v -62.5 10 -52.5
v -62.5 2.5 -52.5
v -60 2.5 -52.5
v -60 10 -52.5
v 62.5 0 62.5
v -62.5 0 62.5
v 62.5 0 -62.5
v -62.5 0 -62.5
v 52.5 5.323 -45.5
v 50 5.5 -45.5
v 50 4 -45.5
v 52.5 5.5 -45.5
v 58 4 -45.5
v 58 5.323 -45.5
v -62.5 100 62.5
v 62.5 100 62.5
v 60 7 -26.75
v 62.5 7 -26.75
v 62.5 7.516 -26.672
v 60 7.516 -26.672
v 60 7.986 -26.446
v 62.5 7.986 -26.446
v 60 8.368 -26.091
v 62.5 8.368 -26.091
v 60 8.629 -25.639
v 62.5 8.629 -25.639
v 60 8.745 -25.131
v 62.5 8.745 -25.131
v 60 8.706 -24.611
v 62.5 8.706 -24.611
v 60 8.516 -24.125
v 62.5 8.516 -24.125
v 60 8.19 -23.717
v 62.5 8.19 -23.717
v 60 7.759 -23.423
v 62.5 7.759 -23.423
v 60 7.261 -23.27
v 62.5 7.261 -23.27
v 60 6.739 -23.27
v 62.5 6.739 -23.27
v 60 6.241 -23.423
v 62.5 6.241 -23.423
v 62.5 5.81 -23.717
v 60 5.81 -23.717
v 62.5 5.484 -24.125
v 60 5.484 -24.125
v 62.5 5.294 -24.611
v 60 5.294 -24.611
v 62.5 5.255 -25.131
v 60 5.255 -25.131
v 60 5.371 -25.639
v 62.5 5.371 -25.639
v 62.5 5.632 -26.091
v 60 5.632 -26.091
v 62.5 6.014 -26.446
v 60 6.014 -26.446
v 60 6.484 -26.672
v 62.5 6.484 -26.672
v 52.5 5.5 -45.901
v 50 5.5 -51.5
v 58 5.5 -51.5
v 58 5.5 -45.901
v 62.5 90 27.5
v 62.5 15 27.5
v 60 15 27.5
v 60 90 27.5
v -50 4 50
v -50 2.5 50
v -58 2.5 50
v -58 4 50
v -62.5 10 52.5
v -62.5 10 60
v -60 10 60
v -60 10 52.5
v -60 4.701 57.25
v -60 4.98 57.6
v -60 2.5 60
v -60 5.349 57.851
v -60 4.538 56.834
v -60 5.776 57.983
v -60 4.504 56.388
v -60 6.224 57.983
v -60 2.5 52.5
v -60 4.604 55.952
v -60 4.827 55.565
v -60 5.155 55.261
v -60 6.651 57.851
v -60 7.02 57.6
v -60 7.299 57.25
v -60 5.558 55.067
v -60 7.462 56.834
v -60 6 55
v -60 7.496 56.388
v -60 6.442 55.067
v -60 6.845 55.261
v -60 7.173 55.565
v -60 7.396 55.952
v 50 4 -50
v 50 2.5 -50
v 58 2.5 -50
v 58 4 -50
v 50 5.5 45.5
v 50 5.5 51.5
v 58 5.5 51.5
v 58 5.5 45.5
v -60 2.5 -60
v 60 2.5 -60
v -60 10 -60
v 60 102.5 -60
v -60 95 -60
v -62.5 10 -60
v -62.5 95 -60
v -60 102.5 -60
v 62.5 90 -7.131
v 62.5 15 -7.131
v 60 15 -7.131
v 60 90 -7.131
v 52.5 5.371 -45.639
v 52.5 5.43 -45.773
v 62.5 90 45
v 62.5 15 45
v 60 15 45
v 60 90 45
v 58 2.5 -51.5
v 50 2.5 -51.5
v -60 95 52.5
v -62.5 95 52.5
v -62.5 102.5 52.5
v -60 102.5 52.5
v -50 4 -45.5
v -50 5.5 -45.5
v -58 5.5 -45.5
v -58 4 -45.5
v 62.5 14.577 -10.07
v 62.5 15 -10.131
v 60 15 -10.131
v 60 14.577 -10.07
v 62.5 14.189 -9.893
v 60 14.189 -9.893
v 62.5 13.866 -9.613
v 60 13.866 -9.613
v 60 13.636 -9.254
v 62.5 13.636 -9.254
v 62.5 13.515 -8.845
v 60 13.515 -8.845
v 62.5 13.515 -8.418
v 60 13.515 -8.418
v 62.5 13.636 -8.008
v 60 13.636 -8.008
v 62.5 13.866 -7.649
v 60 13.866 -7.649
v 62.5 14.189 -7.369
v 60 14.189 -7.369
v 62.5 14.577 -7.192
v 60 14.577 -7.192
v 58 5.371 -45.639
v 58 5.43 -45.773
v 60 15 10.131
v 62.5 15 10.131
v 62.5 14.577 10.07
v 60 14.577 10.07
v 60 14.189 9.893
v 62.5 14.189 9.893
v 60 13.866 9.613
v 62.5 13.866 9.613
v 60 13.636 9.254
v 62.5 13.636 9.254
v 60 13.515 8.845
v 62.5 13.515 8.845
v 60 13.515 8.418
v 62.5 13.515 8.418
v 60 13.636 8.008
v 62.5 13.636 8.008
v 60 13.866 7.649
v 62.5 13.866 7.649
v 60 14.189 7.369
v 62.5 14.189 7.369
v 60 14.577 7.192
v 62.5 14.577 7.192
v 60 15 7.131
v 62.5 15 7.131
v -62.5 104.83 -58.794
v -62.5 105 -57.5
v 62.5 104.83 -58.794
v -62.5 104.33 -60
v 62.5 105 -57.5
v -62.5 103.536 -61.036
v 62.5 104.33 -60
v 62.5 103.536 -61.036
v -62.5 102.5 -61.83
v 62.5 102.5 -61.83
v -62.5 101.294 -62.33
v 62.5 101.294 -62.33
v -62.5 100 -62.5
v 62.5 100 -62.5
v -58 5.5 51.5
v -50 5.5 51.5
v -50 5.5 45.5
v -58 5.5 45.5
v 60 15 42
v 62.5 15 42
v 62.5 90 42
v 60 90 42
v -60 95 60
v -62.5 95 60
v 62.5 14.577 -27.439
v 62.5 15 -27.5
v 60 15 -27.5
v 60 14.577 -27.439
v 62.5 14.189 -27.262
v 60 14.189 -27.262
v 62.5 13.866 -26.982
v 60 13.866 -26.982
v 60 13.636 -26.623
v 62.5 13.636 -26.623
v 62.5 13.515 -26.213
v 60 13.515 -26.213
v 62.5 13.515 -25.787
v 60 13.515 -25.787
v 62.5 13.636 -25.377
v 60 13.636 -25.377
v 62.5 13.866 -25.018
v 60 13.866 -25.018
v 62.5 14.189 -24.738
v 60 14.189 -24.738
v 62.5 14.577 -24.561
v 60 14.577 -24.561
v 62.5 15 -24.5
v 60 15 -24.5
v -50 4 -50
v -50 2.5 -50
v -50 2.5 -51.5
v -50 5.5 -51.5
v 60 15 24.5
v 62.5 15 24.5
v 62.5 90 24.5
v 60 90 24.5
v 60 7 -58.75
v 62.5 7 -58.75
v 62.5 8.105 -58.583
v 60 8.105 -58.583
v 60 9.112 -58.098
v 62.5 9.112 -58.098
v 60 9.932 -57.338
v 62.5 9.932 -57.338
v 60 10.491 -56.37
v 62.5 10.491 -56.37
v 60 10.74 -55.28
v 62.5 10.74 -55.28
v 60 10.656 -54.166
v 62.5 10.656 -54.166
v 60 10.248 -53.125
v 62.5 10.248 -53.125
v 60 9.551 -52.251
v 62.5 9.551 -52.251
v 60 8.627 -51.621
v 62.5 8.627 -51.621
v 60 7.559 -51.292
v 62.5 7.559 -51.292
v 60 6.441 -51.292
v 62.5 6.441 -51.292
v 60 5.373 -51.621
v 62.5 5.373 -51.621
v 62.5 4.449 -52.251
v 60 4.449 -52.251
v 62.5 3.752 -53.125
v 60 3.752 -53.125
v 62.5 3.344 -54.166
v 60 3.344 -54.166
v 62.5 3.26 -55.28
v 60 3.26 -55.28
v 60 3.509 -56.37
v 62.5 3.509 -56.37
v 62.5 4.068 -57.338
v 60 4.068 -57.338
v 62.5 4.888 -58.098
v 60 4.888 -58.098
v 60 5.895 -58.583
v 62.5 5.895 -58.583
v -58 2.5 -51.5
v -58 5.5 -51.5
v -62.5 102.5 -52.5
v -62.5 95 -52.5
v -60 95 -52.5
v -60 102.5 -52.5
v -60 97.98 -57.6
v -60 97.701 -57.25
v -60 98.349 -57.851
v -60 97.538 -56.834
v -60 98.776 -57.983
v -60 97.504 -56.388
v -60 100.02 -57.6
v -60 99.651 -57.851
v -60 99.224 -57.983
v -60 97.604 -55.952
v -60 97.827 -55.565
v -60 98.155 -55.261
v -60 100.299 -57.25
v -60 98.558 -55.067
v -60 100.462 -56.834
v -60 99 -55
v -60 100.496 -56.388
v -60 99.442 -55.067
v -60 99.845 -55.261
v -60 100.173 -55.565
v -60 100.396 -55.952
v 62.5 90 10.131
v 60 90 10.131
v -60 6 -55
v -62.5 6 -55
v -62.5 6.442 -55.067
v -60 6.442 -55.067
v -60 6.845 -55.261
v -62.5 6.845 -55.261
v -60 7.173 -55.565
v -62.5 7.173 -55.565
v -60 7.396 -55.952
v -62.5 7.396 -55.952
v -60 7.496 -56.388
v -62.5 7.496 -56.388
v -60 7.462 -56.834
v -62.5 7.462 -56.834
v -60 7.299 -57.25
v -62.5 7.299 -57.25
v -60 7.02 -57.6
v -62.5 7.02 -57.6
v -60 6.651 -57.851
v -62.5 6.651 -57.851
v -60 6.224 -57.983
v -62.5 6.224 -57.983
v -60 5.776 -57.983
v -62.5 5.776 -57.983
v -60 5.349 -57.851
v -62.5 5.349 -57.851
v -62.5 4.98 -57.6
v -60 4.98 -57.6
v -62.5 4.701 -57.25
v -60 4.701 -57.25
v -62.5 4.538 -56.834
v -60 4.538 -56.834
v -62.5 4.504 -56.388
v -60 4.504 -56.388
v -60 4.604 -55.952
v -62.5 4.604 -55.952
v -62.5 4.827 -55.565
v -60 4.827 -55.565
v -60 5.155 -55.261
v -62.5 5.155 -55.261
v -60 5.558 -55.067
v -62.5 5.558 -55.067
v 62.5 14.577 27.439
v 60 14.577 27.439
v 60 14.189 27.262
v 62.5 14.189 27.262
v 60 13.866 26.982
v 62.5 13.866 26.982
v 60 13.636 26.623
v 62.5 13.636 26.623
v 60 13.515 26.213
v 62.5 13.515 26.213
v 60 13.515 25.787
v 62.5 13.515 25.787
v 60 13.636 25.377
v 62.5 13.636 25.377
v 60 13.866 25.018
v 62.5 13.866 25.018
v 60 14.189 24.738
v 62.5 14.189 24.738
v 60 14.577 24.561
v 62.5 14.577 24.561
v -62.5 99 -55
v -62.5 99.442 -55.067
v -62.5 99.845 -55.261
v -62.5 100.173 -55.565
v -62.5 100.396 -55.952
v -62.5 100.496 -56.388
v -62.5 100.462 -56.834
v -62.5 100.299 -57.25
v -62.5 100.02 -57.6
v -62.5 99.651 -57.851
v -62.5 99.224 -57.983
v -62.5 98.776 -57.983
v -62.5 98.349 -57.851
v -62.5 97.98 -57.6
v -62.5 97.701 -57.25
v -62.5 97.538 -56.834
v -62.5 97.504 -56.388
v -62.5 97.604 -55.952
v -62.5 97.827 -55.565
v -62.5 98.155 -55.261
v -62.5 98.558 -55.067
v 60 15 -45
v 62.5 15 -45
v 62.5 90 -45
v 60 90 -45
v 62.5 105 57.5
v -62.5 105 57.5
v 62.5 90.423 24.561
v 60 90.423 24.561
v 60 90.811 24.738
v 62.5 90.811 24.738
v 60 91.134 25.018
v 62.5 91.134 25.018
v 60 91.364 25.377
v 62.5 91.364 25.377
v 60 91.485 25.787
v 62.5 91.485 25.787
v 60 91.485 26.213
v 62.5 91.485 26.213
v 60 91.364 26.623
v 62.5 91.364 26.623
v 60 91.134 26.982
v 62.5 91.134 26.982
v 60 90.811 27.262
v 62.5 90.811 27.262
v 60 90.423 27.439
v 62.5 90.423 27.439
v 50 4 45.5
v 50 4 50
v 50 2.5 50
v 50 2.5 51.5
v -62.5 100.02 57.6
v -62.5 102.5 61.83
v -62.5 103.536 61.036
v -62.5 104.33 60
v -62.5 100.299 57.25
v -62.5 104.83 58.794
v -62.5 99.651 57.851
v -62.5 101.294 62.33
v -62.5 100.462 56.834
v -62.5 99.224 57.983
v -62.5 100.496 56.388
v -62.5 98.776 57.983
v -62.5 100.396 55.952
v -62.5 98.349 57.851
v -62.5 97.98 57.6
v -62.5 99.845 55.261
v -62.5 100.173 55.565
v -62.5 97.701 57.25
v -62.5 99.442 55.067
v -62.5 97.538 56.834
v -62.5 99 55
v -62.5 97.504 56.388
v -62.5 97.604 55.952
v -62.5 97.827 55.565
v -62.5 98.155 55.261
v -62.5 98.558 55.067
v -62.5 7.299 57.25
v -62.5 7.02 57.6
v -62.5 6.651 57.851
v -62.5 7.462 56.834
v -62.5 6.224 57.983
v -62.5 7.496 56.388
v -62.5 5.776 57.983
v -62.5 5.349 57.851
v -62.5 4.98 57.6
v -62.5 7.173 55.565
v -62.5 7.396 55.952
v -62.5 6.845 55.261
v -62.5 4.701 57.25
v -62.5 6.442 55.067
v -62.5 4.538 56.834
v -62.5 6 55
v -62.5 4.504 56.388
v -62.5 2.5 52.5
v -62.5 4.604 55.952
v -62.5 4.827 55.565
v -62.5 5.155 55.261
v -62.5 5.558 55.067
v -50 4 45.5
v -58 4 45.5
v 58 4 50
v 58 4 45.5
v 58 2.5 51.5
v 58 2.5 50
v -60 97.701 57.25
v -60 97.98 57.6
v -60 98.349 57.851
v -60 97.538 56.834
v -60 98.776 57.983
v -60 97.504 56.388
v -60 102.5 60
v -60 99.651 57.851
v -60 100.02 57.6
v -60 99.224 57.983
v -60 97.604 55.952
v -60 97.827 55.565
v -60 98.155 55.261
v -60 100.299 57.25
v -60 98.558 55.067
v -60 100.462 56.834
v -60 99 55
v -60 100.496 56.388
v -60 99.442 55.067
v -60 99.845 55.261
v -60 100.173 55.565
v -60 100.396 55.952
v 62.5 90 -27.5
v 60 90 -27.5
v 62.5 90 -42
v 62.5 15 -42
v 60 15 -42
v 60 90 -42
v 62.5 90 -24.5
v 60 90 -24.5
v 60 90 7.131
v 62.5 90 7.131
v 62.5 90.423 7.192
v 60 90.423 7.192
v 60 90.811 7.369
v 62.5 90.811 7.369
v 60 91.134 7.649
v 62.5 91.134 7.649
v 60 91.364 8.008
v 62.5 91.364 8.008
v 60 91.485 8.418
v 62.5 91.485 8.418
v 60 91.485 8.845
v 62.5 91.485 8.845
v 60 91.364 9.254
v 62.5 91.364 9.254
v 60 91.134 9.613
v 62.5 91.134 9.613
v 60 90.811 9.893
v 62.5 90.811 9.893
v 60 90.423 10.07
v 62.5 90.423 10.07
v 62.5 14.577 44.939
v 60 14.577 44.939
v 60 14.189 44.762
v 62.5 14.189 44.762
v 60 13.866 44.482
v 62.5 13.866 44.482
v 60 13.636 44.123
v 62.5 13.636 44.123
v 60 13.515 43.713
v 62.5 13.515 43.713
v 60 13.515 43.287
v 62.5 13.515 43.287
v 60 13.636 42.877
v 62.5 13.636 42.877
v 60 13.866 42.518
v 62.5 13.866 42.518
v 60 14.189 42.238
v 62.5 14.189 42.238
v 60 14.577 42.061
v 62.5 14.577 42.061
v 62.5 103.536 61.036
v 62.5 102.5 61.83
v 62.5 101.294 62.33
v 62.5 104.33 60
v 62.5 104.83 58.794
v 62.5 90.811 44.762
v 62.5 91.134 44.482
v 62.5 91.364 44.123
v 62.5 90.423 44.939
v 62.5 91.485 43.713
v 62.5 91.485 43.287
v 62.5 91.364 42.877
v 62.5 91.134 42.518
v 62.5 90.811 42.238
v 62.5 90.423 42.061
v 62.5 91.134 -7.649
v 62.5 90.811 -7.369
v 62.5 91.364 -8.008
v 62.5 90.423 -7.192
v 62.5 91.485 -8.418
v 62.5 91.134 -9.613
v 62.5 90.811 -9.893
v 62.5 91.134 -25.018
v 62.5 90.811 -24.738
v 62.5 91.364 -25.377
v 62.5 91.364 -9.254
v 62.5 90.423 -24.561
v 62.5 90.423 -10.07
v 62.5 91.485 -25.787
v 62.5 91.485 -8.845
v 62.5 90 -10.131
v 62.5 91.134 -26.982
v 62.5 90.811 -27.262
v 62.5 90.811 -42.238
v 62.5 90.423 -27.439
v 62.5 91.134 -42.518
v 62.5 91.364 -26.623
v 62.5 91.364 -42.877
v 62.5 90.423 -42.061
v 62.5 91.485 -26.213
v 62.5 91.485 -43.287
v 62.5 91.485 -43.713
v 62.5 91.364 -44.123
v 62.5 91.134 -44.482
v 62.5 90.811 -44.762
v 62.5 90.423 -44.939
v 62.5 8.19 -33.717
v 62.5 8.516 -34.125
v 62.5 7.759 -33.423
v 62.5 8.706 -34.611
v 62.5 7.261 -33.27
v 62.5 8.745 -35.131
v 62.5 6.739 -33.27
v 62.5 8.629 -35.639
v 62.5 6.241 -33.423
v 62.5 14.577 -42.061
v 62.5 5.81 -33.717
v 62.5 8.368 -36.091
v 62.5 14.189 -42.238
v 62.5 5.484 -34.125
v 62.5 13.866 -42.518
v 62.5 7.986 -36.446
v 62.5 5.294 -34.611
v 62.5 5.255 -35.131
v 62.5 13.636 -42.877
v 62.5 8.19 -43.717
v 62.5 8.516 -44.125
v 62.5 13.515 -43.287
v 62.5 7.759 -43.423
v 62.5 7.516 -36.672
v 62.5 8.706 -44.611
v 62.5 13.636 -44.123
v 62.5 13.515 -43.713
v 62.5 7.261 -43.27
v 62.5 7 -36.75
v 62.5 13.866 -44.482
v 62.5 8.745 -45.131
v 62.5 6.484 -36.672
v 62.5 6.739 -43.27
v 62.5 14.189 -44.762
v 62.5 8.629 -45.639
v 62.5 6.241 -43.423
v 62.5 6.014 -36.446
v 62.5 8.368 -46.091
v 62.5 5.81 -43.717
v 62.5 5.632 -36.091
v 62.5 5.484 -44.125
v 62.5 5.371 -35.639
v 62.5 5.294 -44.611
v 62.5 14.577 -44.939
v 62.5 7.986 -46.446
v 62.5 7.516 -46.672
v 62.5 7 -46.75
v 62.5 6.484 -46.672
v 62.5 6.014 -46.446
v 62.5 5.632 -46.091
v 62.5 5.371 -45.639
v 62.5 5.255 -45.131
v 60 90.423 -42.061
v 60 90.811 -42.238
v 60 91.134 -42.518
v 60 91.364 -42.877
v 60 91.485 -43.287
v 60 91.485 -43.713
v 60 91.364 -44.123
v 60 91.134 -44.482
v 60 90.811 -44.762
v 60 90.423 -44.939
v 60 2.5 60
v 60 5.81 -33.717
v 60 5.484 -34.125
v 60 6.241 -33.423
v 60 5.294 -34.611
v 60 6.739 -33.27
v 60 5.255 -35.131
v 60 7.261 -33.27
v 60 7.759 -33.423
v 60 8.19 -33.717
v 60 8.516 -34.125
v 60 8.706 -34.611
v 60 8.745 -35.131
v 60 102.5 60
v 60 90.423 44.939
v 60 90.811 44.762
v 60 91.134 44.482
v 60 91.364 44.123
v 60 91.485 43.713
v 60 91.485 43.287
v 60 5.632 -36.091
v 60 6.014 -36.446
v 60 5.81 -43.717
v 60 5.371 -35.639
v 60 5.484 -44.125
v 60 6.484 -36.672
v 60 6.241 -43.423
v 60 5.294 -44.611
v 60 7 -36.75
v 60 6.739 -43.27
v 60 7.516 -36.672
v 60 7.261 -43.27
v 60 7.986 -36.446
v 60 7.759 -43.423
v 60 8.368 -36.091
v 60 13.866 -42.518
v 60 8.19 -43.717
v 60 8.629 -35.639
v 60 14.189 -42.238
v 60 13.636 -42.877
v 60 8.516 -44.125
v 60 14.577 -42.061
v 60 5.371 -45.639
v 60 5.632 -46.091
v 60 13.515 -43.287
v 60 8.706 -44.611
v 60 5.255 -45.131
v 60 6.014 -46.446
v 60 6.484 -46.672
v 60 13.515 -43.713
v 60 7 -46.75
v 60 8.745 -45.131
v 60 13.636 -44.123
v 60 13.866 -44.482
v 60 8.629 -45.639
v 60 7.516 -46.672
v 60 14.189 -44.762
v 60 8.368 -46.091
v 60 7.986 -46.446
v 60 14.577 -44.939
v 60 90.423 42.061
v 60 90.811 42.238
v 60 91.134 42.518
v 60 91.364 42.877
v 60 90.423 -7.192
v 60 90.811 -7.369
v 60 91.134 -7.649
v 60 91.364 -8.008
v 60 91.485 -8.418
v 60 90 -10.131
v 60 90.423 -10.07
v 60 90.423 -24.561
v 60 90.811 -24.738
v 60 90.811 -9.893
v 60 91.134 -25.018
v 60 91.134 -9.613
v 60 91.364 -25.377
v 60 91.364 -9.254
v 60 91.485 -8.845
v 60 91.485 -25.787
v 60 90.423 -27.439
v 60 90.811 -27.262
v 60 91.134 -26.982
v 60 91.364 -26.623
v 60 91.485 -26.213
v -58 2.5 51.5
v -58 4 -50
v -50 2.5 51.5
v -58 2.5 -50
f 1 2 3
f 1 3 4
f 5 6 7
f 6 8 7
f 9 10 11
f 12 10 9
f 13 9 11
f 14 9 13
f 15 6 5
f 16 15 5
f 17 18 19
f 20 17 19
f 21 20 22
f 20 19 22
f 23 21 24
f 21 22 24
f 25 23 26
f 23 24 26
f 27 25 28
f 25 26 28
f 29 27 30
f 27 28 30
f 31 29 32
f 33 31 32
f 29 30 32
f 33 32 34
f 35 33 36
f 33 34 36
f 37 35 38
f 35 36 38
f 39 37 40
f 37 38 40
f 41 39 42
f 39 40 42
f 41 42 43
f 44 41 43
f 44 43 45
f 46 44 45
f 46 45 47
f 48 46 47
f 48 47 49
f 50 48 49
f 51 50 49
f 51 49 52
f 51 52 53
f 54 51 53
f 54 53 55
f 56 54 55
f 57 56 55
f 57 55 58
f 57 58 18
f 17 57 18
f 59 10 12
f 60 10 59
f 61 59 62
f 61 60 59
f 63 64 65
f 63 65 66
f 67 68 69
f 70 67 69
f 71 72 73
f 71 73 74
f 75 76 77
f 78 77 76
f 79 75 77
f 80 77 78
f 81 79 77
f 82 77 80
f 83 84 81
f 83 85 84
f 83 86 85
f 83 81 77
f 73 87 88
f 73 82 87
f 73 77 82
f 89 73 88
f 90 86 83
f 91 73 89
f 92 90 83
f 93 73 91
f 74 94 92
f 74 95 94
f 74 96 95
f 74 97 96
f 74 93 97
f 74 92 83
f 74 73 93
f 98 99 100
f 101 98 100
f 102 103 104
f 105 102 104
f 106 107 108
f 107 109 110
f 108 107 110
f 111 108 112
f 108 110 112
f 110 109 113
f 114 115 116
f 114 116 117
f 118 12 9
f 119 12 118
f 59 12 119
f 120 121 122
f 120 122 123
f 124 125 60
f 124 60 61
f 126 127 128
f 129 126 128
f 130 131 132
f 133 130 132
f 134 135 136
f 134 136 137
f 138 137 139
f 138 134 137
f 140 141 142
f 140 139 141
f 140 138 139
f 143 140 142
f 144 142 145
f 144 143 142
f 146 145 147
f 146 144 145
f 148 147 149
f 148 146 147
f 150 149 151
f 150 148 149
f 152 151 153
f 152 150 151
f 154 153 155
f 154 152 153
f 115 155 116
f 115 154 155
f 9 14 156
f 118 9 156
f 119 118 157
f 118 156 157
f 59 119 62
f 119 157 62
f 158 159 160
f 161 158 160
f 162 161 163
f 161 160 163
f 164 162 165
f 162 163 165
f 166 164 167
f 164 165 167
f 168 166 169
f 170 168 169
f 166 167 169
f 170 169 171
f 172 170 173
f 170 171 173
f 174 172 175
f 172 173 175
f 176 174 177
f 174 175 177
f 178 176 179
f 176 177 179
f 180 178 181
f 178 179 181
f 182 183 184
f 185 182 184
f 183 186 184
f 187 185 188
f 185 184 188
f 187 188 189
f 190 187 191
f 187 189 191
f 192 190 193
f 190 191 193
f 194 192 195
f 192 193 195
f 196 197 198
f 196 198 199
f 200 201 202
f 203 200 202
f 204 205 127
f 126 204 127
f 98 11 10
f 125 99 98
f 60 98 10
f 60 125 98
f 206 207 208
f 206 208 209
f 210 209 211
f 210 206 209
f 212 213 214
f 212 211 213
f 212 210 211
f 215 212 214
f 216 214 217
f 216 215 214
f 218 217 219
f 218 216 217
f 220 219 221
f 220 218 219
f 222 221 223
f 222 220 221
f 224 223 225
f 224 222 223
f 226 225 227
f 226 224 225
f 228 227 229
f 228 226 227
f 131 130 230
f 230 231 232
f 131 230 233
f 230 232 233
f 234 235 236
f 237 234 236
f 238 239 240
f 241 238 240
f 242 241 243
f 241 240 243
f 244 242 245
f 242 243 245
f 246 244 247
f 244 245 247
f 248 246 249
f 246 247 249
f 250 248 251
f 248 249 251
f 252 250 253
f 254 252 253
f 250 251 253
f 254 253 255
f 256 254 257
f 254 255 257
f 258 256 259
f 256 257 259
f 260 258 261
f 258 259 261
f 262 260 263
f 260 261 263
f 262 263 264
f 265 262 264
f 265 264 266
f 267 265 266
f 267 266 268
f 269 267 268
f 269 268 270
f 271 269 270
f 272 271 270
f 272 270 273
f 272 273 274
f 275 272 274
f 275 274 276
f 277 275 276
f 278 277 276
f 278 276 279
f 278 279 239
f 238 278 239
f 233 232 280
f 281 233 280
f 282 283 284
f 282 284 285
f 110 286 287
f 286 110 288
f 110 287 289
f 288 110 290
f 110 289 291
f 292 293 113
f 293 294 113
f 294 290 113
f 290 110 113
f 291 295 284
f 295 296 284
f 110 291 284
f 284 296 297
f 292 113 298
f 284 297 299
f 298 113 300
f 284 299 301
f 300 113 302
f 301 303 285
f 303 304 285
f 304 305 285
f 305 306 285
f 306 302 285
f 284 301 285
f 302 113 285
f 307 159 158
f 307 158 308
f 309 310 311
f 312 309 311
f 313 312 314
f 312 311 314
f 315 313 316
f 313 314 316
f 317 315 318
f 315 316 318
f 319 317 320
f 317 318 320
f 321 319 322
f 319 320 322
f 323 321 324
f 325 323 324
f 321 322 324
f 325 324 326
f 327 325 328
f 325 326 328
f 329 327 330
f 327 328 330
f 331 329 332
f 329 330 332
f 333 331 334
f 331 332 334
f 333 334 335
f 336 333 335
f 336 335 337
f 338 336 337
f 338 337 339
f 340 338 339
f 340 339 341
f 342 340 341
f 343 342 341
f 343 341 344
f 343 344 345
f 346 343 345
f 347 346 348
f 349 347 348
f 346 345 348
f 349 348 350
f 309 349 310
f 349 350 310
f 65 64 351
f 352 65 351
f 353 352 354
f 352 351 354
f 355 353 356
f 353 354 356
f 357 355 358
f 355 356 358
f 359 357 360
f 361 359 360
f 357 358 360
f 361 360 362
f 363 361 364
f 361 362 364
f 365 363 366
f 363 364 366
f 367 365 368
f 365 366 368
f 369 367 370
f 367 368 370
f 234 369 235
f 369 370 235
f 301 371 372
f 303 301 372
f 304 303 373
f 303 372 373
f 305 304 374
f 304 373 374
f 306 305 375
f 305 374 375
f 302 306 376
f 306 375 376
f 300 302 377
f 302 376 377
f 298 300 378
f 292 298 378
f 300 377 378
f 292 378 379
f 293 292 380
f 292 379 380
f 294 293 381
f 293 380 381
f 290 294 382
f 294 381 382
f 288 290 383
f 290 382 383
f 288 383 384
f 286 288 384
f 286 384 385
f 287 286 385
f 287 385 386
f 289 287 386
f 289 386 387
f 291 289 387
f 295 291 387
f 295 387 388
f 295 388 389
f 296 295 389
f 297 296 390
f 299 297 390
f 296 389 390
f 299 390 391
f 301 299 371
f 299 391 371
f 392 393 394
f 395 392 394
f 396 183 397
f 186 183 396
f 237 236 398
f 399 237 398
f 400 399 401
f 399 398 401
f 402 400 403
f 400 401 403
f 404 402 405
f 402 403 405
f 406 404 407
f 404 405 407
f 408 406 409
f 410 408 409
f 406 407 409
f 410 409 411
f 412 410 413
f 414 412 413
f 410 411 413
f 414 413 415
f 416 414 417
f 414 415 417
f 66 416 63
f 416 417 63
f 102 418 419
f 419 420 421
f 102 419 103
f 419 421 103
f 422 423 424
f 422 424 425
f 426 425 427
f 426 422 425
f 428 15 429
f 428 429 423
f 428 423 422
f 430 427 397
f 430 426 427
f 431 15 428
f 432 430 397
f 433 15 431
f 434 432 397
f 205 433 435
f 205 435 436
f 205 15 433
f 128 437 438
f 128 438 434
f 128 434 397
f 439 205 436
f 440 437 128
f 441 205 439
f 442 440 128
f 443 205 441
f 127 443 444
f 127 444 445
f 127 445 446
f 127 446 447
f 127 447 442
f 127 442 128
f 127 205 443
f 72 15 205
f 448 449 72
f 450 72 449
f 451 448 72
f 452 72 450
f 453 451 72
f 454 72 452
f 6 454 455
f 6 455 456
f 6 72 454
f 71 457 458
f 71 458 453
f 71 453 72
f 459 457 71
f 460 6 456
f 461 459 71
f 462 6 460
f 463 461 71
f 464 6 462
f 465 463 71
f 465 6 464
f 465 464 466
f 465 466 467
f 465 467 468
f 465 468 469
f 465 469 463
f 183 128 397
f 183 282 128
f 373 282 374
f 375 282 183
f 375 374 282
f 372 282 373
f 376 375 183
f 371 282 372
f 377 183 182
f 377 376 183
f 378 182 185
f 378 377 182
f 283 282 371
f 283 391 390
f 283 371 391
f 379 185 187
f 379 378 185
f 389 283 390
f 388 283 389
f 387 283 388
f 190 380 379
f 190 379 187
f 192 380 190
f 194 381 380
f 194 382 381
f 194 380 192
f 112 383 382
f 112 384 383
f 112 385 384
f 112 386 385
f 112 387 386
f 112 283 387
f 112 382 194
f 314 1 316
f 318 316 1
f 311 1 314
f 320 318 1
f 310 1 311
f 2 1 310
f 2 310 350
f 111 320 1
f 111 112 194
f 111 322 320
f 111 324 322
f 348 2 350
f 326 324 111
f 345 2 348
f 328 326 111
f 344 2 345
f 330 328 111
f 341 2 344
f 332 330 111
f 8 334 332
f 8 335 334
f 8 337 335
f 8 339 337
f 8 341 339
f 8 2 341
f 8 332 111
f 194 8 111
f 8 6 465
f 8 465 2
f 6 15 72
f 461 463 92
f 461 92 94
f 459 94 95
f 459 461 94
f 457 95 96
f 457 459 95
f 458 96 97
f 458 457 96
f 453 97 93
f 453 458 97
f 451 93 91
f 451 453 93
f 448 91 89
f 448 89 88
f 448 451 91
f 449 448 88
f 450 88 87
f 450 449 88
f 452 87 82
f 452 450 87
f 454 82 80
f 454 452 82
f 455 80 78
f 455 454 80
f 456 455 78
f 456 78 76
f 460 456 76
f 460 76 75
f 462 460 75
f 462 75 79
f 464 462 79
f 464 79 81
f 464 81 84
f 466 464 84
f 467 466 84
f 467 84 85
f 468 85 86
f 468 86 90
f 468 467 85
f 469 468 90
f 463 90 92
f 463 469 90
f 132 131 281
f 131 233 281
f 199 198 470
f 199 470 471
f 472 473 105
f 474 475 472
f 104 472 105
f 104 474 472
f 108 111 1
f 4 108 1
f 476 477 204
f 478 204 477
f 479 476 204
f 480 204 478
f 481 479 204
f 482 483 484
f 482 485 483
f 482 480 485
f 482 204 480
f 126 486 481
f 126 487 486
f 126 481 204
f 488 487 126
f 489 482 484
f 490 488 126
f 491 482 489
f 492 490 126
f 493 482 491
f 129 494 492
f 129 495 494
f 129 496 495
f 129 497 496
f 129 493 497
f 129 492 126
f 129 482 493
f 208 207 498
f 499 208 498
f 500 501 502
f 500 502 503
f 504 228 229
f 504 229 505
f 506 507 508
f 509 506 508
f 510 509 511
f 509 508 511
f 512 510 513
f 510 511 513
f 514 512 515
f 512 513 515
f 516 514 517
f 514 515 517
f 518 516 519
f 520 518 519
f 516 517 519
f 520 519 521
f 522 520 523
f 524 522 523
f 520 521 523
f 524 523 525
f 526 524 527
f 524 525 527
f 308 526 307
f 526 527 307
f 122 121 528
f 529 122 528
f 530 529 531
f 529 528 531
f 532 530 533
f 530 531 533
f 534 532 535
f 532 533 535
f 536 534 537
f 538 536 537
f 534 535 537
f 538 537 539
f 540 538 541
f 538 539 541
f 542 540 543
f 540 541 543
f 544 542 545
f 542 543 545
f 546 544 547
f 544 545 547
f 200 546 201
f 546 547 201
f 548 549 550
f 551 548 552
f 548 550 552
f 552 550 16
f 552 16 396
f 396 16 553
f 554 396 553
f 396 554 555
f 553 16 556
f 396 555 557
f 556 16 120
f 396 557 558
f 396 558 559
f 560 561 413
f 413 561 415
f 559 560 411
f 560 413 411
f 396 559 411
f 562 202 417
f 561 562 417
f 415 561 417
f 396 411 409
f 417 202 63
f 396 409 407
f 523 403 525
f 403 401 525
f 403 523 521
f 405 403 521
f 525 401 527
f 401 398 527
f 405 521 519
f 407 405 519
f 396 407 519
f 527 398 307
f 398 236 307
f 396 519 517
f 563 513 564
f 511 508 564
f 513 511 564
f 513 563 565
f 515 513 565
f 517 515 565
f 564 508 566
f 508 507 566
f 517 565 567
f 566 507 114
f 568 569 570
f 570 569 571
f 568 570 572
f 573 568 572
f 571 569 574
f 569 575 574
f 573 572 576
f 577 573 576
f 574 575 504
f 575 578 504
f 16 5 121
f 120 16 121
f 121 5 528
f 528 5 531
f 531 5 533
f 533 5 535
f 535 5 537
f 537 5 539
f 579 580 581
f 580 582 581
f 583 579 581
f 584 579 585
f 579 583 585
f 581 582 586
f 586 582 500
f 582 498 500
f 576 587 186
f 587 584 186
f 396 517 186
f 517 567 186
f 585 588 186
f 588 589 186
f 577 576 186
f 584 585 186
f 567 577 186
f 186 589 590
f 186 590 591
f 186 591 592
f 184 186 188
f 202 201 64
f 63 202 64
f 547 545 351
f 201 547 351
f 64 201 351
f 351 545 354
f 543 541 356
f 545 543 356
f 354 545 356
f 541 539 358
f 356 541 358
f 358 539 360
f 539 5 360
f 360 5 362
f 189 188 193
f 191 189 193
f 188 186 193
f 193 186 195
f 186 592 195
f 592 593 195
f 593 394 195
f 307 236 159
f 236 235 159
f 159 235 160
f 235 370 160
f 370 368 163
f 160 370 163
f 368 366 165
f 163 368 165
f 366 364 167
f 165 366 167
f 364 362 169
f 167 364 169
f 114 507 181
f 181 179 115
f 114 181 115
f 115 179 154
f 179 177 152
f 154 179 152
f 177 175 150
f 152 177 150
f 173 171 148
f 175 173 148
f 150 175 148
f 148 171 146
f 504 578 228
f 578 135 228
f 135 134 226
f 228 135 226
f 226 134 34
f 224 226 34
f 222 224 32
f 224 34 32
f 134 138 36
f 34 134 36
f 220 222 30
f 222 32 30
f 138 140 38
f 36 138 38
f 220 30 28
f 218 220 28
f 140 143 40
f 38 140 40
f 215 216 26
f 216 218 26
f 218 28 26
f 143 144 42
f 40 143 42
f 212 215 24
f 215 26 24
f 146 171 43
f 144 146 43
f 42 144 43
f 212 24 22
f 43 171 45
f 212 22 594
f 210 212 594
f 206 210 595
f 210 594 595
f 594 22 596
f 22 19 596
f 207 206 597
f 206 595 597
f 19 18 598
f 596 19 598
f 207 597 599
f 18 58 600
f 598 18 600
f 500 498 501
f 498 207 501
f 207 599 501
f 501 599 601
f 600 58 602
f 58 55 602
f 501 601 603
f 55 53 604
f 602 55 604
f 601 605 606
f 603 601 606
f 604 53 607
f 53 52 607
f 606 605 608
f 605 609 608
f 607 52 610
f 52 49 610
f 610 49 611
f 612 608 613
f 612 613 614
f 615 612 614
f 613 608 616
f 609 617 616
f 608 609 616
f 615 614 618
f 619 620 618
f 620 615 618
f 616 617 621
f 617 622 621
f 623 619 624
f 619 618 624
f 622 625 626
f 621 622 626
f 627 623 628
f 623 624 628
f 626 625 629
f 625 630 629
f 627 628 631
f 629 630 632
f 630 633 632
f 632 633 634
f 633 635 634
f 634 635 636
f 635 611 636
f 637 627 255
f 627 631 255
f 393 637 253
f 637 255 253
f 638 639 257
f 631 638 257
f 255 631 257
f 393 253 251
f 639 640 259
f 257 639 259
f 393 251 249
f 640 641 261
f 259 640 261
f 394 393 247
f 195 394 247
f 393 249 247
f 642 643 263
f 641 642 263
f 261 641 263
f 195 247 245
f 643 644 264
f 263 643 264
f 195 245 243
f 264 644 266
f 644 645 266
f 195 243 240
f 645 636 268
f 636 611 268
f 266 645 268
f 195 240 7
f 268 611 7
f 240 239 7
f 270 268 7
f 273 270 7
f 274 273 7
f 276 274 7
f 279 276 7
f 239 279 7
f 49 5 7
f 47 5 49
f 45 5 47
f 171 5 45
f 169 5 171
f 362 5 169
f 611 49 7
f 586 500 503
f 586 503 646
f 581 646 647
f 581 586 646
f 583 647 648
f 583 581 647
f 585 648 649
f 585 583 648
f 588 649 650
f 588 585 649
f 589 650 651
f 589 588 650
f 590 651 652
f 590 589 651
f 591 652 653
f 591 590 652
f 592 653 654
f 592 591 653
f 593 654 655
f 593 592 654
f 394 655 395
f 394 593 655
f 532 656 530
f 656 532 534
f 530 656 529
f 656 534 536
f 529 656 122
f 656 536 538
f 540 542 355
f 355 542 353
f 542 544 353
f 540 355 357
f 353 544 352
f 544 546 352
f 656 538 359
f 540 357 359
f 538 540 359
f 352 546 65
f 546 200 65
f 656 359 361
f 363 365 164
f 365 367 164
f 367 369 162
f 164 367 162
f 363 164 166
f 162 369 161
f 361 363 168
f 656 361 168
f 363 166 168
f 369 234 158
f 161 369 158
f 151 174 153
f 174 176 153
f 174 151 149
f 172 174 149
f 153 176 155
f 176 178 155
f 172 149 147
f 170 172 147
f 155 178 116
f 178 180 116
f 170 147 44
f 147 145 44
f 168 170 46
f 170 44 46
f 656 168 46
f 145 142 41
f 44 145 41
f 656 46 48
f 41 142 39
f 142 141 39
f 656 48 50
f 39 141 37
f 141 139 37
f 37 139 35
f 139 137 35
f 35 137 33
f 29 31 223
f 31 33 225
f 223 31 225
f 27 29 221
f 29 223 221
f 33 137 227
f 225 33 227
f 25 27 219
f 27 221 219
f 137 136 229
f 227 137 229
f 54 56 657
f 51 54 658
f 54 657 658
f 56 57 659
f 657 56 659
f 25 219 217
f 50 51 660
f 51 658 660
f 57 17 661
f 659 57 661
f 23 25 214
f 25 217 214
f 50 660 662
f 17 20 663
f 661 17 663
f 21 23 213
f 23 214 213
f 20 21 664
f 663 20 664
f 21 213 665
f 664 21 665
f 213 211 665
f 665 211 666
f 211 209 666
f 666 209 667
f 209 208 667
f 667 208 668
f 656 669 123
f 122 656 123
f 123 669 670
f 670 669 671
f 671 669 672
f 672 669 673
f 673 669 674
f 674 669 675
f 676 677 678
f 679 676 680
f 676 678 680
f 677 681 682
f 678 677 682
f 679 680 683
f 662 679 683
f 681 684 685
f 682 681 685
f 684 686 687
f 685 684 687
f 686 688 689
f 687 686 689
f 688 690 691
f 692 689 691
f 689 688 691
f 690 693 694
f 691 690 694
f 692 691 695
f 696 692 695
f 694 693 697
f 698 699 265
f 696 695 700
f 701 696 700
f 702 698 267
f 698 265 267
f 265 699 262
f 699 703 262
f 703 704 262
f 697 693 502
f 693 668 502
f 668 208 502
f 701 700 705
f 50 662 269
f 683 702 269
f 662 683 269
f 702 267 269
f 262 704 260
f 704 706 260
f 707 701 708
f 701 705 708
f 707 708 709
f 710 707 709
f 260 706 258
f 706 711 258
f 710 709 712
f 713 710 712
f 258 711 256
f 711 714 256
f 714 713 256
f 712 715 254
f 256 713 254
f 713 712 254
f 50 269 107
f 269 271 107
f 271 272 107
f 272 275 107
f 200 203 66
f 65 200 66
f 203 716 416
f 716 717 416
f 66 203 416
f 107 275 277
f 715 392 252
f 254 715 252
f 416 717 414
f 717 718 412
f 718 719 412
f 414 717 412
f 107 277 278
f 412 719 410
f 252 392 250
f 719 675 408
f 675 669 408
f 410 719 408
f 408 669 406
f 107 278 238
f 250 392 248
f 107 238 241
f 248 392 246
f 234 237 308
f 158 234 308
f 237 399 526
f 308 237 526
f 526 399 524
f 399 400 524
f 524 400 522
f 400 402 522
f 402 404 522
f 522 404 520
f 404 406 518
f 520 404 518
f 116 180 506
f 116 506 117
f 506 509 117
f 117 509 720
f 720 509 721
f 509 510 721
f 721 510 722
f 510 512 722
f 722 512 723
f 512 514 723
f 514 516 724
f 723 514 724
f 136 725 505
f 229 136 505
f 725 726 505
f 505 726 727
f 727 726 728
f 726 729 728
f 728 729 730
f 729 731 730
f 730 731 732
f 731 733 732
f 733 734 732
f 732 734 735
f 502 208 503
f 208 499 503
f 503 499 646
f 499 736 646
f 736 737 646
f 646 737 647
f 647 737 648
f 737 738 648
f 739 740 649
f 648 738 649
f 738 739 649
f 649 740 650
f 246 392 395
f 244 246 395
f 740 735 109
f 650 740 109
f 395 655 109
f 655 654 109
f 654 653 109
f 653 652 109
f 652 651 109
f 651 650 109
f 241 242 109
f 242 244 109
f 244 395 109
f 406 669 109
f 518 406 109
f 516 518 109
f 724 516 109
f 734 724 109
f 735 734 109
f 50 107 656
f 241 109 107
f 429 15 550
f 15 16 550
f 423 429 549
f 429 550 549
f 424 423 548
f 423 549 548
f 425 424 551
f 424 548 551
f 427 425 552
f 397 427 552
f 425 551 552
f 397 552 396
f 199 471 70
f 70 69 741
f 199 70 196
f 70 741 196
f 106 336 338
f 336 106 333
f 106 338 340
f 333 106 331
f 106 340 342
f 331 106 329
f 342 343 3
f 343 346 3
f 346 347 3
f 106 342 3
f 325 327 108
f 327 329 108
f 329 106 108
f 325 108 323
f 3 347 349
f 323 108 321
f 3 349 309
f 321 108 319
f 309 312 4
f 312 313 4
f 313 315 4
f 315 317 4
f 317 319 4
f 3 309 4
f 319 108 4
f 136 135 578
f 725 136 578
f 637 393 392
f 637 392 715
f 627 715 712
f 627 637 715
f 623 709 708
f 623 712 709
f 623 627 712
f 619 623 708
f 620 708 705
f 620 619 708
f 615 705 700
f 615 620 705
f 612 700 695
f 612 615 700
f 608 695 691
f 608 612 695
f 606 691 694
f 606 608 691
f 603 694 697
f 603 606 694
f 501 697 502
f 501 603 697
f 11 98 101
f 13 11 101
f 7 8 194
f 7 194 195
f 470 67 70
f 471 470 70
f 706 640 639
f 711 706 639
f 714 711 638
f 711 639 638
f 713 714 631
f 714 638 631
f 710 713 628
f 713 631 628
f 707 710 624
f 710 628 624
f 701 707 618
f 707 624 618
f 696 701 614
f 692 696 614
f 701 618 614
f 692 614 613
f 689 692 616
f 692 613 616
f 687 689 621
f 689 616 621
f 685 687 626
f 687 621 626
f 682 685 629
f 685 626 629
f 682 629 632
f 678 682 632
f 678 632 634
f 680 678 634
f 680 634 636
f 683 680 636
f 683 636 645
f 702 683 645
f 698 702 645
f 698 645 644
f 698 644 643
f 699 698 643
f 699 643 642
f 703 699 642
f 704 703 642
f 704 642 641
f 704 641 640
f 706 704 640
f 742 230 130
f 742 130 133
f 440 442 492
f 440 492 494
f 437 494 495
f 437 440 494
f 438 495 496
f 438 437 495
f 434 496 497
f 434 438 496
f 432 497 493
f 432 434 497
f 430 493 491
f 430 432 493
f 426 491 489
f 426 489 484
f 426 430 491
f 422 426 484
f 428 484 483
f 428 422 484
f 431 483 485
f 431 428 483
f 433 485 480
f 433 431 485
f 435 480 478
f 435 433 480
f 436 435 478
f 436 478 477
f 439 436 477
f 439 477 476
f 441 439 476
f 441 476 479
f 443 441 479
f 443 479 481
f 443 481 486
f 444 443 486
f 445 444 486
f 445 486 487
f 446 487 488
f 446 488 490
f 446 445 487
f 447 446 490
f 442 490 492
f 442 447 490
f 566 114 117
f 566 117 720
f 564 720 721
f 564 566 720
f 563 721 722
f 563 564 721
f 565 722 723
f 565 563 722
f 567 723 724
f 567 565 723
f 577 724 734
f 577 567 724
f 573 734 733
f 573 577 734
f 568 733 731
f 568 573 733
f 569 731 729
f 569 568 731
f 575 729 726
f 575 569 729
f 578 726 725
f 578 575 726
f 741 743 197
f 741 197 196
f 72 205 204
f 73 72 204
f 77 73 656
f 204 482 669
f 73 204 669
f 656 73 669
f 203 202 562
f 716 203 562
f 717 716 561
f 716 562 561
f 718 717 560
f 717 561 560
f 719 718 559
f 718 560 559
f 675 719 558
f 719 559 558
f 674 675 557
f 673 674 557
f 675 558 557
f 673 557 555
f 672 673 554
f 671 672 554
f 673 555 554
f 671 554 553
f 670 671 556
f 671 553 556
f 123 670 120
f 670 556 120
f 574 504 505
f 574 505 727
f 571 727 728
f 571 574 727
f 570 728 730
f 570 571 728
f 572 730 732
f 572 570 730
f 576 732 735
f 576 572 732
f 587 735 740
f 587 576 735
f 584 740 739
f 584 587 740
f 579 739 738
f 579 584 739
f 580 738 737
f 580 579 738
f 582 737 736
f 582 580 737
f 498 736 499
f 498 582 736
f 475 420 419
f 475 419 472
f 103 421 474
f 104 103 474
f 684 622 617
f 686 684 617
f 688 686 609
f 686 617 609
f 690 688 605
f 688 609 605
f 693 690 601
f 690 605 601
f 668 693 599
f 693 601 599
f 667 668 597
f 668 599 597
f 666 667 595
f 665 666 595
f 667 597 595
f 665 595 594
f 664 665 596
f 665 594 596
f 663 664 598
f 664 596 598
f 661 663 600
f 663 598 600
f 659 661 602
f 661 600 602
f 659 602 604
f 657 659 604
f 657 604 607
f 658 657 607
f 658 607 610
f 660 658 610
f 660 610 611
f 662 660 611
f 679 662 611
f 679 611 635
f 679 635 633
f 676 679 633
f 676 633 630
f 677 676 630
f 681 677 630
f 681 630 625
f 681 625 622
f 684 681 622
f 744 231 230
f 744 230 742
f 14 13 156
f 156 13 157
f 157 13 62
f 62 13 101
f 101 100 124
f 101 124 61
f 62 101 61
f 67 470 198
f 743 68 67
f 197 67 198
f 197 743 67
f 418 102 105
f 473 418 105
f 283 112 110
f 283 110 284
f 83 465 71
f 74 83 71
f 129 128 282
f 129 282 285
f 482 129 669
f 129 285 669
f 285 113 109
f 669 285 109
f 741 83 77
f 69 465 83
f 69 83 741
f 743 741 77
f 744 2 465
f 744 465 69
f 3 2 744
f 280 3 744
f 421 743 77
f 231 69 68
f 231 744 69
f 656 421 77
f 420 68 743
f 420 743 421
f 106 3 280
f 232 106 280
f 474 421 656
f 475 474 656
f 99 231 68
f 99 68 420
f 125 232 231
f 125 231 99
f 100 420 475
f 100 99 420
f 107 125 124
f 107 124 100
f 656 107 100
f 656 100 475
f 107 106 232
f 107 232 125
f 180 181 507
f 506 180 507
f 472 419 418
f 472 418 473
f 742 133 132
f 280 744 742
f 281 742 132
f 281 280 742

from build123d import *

# Parameters (mm, degrees)
SKETCH1_W                = 125
SKETCH1_H                = 125
BOSS_EXTRUDE1_DEPTH      = 2.5
SKETCH3_W                = 125
SKETCH3_H                = 100
BOSS_EXTRUDE3_DEPTH      = 2.5
SKETCH2_W                = 125
SKETCH2_H                = 100
BOSS_EXTRUDE4_DEPTH      = 2.5
SKETCH5_W                = 125
SKETCH5_H                = 102.5
BOSS_EXTRUDE6_DEPTH      = 2.5
SKETCH11_W               = 8
SKETCH11_H               = 1.5
BOSS_EXTRUDE9_DEPTH      = 3
SKETCH12_W               = 8
SKETCH12_H               = 1.5
BOSS_EXTRUDE10_DEPTH     = 4.5
MIRROR10_COPY_1_SKETCH_W = 8
MIRROR10_COPY_1_SKETCH_H = 1.5
MIRROR10_COPY_1_DEPTH    = 3
MIRROR10_COPY_2_SKETCH_W = 8
MIRROR10_COPY_2_SKETCH_H = 1.5
MIRROR10_COPY_2_DEPTH    = 3
MIRROR11_COPY_1_SKETCH_W = 8
MIRROR11_COPY_1_SKETCH_H = 1.5
MIRROR11_COPY_1_DEPTH    = 4.5
MIRROR11_COPY_2_SKETCH_W = 8
MIRROR11_COPY_2_SKETCH_H = 1.5
MIRROR11_COPY_2_DEPTH    = 4.5
SKETCH13_W               = 3
SKETCH13_H               = 75
CUT_EXTRUDE3_DEPTH       = 4.5
SKETCH15_W               = 3
SKETCH15_H               = 75
CUT_EXTRUDE4_DEPTH       = 4.5
SKETCH17_W               = 3
SKETCH17_H               = 75
CUT_EXTRUDE5_DEPTH       = 4.5
SKETCH18_R               = 1.5
CUT_EXTRUDE6_DEPTH       = 4.5
SKETCH19_R               = 1.5
CUT_EXTRUDE7_DEPTH       = 4.5
SKETCH21_R               = 1.5
CUT_EXTRUDE8_DEPTH       = 4.5
SKETCH20_R               = 1.5
CUT_EXTRUDE9_DEPTH       = 4.5
SKETCH22_R               = 1.5
CUT_EXTRUDE10_DEPTH      = 4.5
SKETCH23_R               = 1.5
CUT_EXTRUDE11_DEPTH      = 4.5
SKETCH24_W               = 125
SKETCH24_H               = 125
BOSS_EXTRUDE11_DEPTH     = 2.5
SKETCH25_W               = 10
SKETCH25_H               = 10
BOSS_EXTRUDE12_DEPTH     = 2.5
SKETCH26_W               = 10
SKETCH26_H               = 10
BOSS_EXTRUDE13_DEPTH     = 2.5
SKETCH27_R               = 1.5
CUT_EXTRUDE12_DEPTH      = 2.5
SKETCH28_R               = 1.5
CUT_EXTRUDE13_DEPTH      = 2.5
SKETCH31_R               = 1.75
CUT_EXTRUDE14_DEPTH      = 10
SKETCH29_R               = 1.75
CUT_EXTRUDE15_DEPTH      = 10
SKETCH32_R               = 1.75
CUT_EXTRUDE16_DEPTH      = 10
FILLET1_R                = 5
FILLET2_R                = 5
SKETCH33_R               = 3.75
CUT_EXTRUDE17_DEPTH      = 10


with BuildPart() as part:
    # Sketch1 → Boss-Extrude1 (new body)
    with BuildSketch(Plane(origin=(0, 0, 0), x_dir=(1, 0, 0), z_dir=(0, 1, 0))):
        Rectangle(SKETCH1_W, SKETCH1_H)
    extrude(amount=BOSS_EXTRUDE1_DEPTH)

    # Sketch3 → Boss-Extrude3 (add)
    with BuildSketch(Plane(origin=(0, 0, -62.5), x_dir=(-1, 0, 0), z_dir=(0, 0, -1))):
        with Locations((0, 52.5)):
            Rectangle(SKETCH3_W, SKETCH3_H)
    extrude(amount=-BOSS_EXTRUDE3_DEPTH)

    # Sketch2 → Boss-Extrude4 (add)
    with BuildSketch(Plane.XY.offset(62.5)):
        with Locations((0, 52.5)):
            Rectangle(SKETCH2_W, SKETCH2_H)
    extrude(amount=-BOSS_EXTRUDE4_DEPTH)

    # Sketch5 → Boss-Extrude6 (add)
    with BuildSketch(Plane(origin=(62.5, 0, 0), x_dir=(0, 0, -1), z_dir=(1, 0, 0))):
        with Locations((0, 51.25)):
            Rectangle(SKETCH5_W, SKETCH5_H)
    extrude(amount=-BOSS_EXTRUDE6_DEPTH)

    # Sketch11 → Boss-Extrude9 (add)
    with BuildSketch(Plane(origin=(0, 2.5, 0), x_dir=(1, 0, 0), z_dir=(0, 1, 0))):
        with Locations((54, 50.75)):
            Rectangle(SKETCH11_W, SKETCH11_H)
    boss_extrude9 = extrude(amount=BOSS_EXTRUDE9_DEPTH)

    # Mirror6: Boss-Extrude9 across plane
    add(boss_extrude9.mirror(Plane.XY))

    # Sketch12 → Boss-Extrude10 (add)
    with BuildSketch(Plane.XY.offset(-50)):
        with Locations((54, 4.75)):
            Rectangle(SKETCH12_W, SKETCH12_H)
    boss_extrude10 = extrude(amount=BOSS_EXTRUDE10_DEPTH)

    # Mirror7: Boss-Extrude10 across plane
    add(boss_extrude10.mirror(Plane.XY))

    # Mirror8: Boss-Extrude9 across plane
    add(boss_extrude9.mirror(Plane(origin=(0, 0, 0), x_dir=(0, 0, 1), z_dir=(1, 0, 0))))

    # Mirror9: Boss-Extrude10 across plane
    add(boss_extrude10.mirror(Plane(origin=(0, 0, 0), x_dir=(0, 0, 1), z_dir=(1, 0, 0))))

    # Mirror10 copy 1 sketch → Mirror10 copy 1 (add)
    with BuildSketch(Plane(origin=(0, 2.5, 0), x_dir=(-1, 0, 0), z_dir=(0, 1, 0))):
        with Locations((54, 50.75)):
            Rectangle(MIRROR10_COPY_1_SKETCH_W, MIRROR10_COPY_1_SKETCH_H)
    extrude(amount=MIRROR10_COPY_1_DEPTH)

    # Mirror10 copy 2 sketch → Mirror10 copy 2 (add)
    with BuildSketch(Plane(origin=(0, 2.5, 0), x_dir=(1, 0, 0), z_dir=(0, 1, 0))):
        with Locations((54, -50.75)):
            Rectangle(MIRROR10_COPY_2_SKETCH_W, MIRROR10_COPY_2_SKETCH_H)
    extrude(amount=MIRROR10_COPY_2_DEPTH)

    # Mirror11 copy 1 sketch → Mirror11 copy 1 (add)
    with BuildSketch(Plane(origin=(0, 0, 50), x_dir=(-1, 0, 0), z_dir=(0, 0, -1))):
        with Locations((54, 4.75)):
            Rectangle(MIRROR11_COPY_1_SKETCH_W, MIRROR11_COPY_1_SKETCH_H)
    extrude(amount=MIRROR11_COPY_1_DEPTH)

    # Mirror11 copy 2 sketch → Mirror11 copy 2 (add)
    with BuildSketch(Plane(origin=(0, 0, 50), x_dir=(1, 0, 0), z_dir=(0, 0, -1))):
        with Locations((54, -4.75)):
            Rectangle(MIRROR11_COPY_2_SKETCH_W, MIRROR11_COPY_2_SKETCH_H)
    extrude(amount=MIRROR11_COPY_2_DEPTH)

    # Sketch13 → Cut-Extrude3 (cut)
    with BuildSketch(Plane(origin=(62.5, 0, -52.868964846), x_dir=(0, 0, -1), z_dir=(1, 0, 0))):
        with Locations((-61.5, 52.5)):
            Rectangle(SKETCH13_W, SKETCH13_H)
    cut_extrude3 = extrude(amount=-CUT_EXTRUDE3_DEPTH, mode=Mode.SUBTRACT)

    # Sketch15 → Cut-Extrude4 (cut)
    with BuildSketch(Plane(origin=(62.5, 0, 0), x_dir=(0, 0, -1), z_dir=(1, 0, 0))):
        with Locations((-43.5, 52.5)):
            Rectangle(SKETCH15_W, SKETCH15_H)
    cut_extrude4 = extrude(amount=-CUT_EXTRUDE4_DEPTH, mode=Mode.SUBTRACT)

    # Sketch17 → Cut-Extrude5 (cut)
    with BuildSketch(Plane(origin=(62.5, 0, 0), x_dir=(0, 0, -1), z_dir=(1, 0, 0))):
        with Locations((-26, 52.5)):
            Rectangle(SKETCH17_W, SKETCH17_H)
    cut_extrude5 = extrude(amount=-CUT_EXTRUDE5_DEPTH, mode=Mode.SUBTRACT)

    # Mirror12: Cut-Extrude5 across plane
    add(cut_extrude5.mirror(Plane.XY), mode=Mode.SUBTRACT)

    # Mirror13: Cut-Extrude4 across plane
    add(cut_extrude4.mirror(Plane.XY), mode=Mode.SUBTRACT)

    # Mirror14: Cut-Extrude3 across plane
    add(cut_extrude3.mirror(Plane.XY), mode=Mode.SUBTRACT)

    # Sketch18 → Cut-Extrude6 (cut)
    with BuildSketch(Plane(origin=(62.5, 0, 0), x_dir=(0, 0, -1), z_dir=(1, 0, 0))):
        with Locations((-8.631035154, 90)):
            Circle(SKETCH18_R)
    cut_extrude6 = extrude(amount=-CUT_EXTRUDE6_DEPTH, mode=Mode.SUBTRACT)

    # Sketch19 → Cut-Extrude7 (cut)
    with BuildSketch(Plane(origin=(62.5, 0, 0), x_dir=(0, 0, -1), z_dir=(1, 0, 0))):
        with Locations((-8.631035154, 15)):
            Circle(SKETCH19_R)
    cut_extrude7 = extrude(amount=-CUT_EXTRUDE7_DEPTH, mode=Mode.SUBTRACT)

    # Sketch21 → Cut-Extrude8 (cut)
    with BuildSketch(Plane(origin=(62.5, 0, 0), x_dir=(0, 0, -1), z_dir=(1, 0, 0))):
        with Locations((-26, 15)):
            Circle(SKETCH21_R)
    cut_extrude8 = extrude(amount=-CUT_EXTRUDE8_DEPTH, mode=Mode.SUBTRACT)

    # Sketch20 → Cut-Extrude9 (cut)
    with BuildSketch(Plane(origin=(62.5, 0, 0), x_dir=(0, 0, -1), z_dir=(1, 0, 0))):
        with Locations((-43.5, 15)):
            Circle(SKETCH20_R)
    cut_extrude9 = extrude(amount=-CUT_EXTRUDE9_DEPTH, mode=Mode.SUBTRACT)

    # Mirror15: Cut-Extrude7 across plane
    add(cut_extrude7.mirror(Plane.XY), mode=Mode.SUBTRACT)

    # Mirror16: Cut-Extrude9 across plane
    add(cut_extrude9.mirror(Plane.XY), mode=Mode.SUBTRACT)

    # Mirror17: Cut-Extrude8 across plane
    add(cut_extrude8.mirror(Plane.XY), mode=Mode.SUBTRACT)

    # Sketch22 → Cut-Extrude10 (cut)
    with BuildSketch(Plane(origin=(62.5, 0, 0), x_dir=(0, 0, -1), z_dir=(1, 0, 0))):
        with Locations((-43.5, 90)):
            Circle(SKETCH22_R)
    cut_extrude10 = extrude(amount=-CUT_EXTRUDE10_DEPTH, mode=Mode.SUBTRACT)

    # Sketch23 → Cut-Extrude11 (cut)
    with BuildSketch(Plane(origin=(62.5, 0, 0), x_dir=(0, 0, -1), z_dir=(1, 0, 0))):
        with Locations((-26, 90)):
            Circle(SKETCH23_R)
    cut_extrude11 = extrude(amount=-CUT_EXTRUDE11_DEPTH, mode=Mode.SUBTRACT)

    # Mirror18: Cut-Extrude10 across plane
    add(cut_extrude10.mirror(Plane.XY), mode=Mode.SUBTRACT)

    # Mirror19: Cut-Extrude6 across plane
    add(cut_extrude6.mirror(Plane.XY), mode=Mode.SUBTRACT)

    # Mirror20: Cut-Extrude11 across plane
    add(cut_extrude11.mirror(Plane.XY), mode=Mode.SUBTRACT)

    # Sketch24 → Boss-Extrude11 (add)
    with BuildSketch(Plane(origin=(0, 102.5, 0), x_dir=(1, 0, 0), z_dir=(0, 1, 0))):
        Rectangle(SKETCH24_W, SKETCH24_H)
    extrude(amount=BOSS_EXTRUDE11_DEPTH)

    # Sketch25 → Boss-Extrude12 (add)
    with BuildSketch(Plane.ZY.offset(62.5)):
        with Locations((-57.5, 100)):
            Rectangle(SKETCH25_W, SKETCH25_H)
    boss_extrude12 = extrude(amount=-BOSS_EXTRUDE12_DEPTH)

    # Mirror21: Boss-Extrude12 across plane
    add(boss_extrude12.mirror(Plane.XY))

    # Sketch26 → Boss-Extrude13 (add)
    with BuildSketch(Plane.ZY.offset(62.5)):
        with Locations((-57.5, 5)):
            Rectangle(SKETCH26_W, SKETCH26_H)
    boss_extrude13 = extrude(amount=-BOSS_EXTRUDE13_DEPTH)

    # Mirror22: Boss-Extrude13 across plane
    add(boss_extrude13.mirror(Plane.XY))

    # Sketch27 → Cut-Extrude12 (cut)
    with BuildSketch(Plane.ZY.offset(62.5)):
        with Locations((-56.5, 99)):
            Circle(SKETCH27_R)
    cut_extrude12 = extrude(amount=-CUT_EXTRUDE12_DEPTH, mode=Mode.SUBTRACT)

    # Mirror23: Cut-Extrude12 across plane
    add(cut_extrude12.mirror(Plane.XY), mode=Mode.SUBTRACT)

    # Sketch28 → Cut-Extrude13 (cut)
    with BuildSketch(Plane.ZY.offset(62.5)):
        with Locations((-56.5, 6)):
            Circle(SKETCH28_R)
    cut_extrude13 = extrude(amount=-CUT_EXTRUDE13_DEPTH, mode=Mode.SUBTRACT)

    # Mirror24: Cut-Extrude13 across plane
    add(cut_extrude13.mirror(Plane.XY), mode=Mode.SUBTRACT)

    # Sketch31 → Cut-Extrude14 (cut)
    with BuildSketch(Plane(origin=(62.5, 0, 0), x_dir=(0, 0, -1), z_dir=(1, 0, 0))):
        with Locations((35, 7)):
            Circle(SKETCH31_R)
    extrude(amount=-CUT_EXTRUDE14_DEPTH, mode=Mode.SUBTRACT)

    # Sketch29 → Cut-Extrude15 (cut)
    with BuildSketch(Plane(origin=(62.5, 0, 0), x_dir=(0, 0, -1), z_dir=(1, 0, 0))):
        with Locations((25, 7)):
            Circle(SKETCH29_R)
    extrude(amount=-CUT_EXTRUDE15_DEPTH, mode=Mode.SUBTRACT)

    # Sketch32 → Cut-Extrude16 (cut)
    with BuildSketch(Plane(origin=(62.5, 0, 0), x_dir=(0, 0, -1), z_dir=(1, 0, 0))):
        with Locations((45, 7)):
            Circle(SKETCH32_R)
    extrude(amount=-CUT_EXTRUDE16_DEPTH, mode=Mode.SUBTRACT)

    # Fillet1
    fillet1_edges = [part.edges().sort_by_distance(p)[0] for p in [
        (0, 105, 62.5),
    ]]
    fillet(fillet1_edges, radius=FILLET1_R)

    # Fillet2
    fillet2_edges = [part.edges().sort_by_distance(p)[0] for p in [
        (0, 105, -62.5),
    ]]
    fillet(fillet2_edges, radius=FILLET2_R)

    # Sketch33 → Cut-Extrude17 (cut)
    with BuildSketch(Plane(origin=(62.5, 0, 0), x_dir=(0, 0, -1), z_dir=(1, 0, 0))):
        with Locations((55, 7)):
            Circle(SKETCH33_R)
    extrude(amount=-CUT_EXTRUDE17_DEPTH, mode=Mode.SUBTRACT)


solid = part.part
